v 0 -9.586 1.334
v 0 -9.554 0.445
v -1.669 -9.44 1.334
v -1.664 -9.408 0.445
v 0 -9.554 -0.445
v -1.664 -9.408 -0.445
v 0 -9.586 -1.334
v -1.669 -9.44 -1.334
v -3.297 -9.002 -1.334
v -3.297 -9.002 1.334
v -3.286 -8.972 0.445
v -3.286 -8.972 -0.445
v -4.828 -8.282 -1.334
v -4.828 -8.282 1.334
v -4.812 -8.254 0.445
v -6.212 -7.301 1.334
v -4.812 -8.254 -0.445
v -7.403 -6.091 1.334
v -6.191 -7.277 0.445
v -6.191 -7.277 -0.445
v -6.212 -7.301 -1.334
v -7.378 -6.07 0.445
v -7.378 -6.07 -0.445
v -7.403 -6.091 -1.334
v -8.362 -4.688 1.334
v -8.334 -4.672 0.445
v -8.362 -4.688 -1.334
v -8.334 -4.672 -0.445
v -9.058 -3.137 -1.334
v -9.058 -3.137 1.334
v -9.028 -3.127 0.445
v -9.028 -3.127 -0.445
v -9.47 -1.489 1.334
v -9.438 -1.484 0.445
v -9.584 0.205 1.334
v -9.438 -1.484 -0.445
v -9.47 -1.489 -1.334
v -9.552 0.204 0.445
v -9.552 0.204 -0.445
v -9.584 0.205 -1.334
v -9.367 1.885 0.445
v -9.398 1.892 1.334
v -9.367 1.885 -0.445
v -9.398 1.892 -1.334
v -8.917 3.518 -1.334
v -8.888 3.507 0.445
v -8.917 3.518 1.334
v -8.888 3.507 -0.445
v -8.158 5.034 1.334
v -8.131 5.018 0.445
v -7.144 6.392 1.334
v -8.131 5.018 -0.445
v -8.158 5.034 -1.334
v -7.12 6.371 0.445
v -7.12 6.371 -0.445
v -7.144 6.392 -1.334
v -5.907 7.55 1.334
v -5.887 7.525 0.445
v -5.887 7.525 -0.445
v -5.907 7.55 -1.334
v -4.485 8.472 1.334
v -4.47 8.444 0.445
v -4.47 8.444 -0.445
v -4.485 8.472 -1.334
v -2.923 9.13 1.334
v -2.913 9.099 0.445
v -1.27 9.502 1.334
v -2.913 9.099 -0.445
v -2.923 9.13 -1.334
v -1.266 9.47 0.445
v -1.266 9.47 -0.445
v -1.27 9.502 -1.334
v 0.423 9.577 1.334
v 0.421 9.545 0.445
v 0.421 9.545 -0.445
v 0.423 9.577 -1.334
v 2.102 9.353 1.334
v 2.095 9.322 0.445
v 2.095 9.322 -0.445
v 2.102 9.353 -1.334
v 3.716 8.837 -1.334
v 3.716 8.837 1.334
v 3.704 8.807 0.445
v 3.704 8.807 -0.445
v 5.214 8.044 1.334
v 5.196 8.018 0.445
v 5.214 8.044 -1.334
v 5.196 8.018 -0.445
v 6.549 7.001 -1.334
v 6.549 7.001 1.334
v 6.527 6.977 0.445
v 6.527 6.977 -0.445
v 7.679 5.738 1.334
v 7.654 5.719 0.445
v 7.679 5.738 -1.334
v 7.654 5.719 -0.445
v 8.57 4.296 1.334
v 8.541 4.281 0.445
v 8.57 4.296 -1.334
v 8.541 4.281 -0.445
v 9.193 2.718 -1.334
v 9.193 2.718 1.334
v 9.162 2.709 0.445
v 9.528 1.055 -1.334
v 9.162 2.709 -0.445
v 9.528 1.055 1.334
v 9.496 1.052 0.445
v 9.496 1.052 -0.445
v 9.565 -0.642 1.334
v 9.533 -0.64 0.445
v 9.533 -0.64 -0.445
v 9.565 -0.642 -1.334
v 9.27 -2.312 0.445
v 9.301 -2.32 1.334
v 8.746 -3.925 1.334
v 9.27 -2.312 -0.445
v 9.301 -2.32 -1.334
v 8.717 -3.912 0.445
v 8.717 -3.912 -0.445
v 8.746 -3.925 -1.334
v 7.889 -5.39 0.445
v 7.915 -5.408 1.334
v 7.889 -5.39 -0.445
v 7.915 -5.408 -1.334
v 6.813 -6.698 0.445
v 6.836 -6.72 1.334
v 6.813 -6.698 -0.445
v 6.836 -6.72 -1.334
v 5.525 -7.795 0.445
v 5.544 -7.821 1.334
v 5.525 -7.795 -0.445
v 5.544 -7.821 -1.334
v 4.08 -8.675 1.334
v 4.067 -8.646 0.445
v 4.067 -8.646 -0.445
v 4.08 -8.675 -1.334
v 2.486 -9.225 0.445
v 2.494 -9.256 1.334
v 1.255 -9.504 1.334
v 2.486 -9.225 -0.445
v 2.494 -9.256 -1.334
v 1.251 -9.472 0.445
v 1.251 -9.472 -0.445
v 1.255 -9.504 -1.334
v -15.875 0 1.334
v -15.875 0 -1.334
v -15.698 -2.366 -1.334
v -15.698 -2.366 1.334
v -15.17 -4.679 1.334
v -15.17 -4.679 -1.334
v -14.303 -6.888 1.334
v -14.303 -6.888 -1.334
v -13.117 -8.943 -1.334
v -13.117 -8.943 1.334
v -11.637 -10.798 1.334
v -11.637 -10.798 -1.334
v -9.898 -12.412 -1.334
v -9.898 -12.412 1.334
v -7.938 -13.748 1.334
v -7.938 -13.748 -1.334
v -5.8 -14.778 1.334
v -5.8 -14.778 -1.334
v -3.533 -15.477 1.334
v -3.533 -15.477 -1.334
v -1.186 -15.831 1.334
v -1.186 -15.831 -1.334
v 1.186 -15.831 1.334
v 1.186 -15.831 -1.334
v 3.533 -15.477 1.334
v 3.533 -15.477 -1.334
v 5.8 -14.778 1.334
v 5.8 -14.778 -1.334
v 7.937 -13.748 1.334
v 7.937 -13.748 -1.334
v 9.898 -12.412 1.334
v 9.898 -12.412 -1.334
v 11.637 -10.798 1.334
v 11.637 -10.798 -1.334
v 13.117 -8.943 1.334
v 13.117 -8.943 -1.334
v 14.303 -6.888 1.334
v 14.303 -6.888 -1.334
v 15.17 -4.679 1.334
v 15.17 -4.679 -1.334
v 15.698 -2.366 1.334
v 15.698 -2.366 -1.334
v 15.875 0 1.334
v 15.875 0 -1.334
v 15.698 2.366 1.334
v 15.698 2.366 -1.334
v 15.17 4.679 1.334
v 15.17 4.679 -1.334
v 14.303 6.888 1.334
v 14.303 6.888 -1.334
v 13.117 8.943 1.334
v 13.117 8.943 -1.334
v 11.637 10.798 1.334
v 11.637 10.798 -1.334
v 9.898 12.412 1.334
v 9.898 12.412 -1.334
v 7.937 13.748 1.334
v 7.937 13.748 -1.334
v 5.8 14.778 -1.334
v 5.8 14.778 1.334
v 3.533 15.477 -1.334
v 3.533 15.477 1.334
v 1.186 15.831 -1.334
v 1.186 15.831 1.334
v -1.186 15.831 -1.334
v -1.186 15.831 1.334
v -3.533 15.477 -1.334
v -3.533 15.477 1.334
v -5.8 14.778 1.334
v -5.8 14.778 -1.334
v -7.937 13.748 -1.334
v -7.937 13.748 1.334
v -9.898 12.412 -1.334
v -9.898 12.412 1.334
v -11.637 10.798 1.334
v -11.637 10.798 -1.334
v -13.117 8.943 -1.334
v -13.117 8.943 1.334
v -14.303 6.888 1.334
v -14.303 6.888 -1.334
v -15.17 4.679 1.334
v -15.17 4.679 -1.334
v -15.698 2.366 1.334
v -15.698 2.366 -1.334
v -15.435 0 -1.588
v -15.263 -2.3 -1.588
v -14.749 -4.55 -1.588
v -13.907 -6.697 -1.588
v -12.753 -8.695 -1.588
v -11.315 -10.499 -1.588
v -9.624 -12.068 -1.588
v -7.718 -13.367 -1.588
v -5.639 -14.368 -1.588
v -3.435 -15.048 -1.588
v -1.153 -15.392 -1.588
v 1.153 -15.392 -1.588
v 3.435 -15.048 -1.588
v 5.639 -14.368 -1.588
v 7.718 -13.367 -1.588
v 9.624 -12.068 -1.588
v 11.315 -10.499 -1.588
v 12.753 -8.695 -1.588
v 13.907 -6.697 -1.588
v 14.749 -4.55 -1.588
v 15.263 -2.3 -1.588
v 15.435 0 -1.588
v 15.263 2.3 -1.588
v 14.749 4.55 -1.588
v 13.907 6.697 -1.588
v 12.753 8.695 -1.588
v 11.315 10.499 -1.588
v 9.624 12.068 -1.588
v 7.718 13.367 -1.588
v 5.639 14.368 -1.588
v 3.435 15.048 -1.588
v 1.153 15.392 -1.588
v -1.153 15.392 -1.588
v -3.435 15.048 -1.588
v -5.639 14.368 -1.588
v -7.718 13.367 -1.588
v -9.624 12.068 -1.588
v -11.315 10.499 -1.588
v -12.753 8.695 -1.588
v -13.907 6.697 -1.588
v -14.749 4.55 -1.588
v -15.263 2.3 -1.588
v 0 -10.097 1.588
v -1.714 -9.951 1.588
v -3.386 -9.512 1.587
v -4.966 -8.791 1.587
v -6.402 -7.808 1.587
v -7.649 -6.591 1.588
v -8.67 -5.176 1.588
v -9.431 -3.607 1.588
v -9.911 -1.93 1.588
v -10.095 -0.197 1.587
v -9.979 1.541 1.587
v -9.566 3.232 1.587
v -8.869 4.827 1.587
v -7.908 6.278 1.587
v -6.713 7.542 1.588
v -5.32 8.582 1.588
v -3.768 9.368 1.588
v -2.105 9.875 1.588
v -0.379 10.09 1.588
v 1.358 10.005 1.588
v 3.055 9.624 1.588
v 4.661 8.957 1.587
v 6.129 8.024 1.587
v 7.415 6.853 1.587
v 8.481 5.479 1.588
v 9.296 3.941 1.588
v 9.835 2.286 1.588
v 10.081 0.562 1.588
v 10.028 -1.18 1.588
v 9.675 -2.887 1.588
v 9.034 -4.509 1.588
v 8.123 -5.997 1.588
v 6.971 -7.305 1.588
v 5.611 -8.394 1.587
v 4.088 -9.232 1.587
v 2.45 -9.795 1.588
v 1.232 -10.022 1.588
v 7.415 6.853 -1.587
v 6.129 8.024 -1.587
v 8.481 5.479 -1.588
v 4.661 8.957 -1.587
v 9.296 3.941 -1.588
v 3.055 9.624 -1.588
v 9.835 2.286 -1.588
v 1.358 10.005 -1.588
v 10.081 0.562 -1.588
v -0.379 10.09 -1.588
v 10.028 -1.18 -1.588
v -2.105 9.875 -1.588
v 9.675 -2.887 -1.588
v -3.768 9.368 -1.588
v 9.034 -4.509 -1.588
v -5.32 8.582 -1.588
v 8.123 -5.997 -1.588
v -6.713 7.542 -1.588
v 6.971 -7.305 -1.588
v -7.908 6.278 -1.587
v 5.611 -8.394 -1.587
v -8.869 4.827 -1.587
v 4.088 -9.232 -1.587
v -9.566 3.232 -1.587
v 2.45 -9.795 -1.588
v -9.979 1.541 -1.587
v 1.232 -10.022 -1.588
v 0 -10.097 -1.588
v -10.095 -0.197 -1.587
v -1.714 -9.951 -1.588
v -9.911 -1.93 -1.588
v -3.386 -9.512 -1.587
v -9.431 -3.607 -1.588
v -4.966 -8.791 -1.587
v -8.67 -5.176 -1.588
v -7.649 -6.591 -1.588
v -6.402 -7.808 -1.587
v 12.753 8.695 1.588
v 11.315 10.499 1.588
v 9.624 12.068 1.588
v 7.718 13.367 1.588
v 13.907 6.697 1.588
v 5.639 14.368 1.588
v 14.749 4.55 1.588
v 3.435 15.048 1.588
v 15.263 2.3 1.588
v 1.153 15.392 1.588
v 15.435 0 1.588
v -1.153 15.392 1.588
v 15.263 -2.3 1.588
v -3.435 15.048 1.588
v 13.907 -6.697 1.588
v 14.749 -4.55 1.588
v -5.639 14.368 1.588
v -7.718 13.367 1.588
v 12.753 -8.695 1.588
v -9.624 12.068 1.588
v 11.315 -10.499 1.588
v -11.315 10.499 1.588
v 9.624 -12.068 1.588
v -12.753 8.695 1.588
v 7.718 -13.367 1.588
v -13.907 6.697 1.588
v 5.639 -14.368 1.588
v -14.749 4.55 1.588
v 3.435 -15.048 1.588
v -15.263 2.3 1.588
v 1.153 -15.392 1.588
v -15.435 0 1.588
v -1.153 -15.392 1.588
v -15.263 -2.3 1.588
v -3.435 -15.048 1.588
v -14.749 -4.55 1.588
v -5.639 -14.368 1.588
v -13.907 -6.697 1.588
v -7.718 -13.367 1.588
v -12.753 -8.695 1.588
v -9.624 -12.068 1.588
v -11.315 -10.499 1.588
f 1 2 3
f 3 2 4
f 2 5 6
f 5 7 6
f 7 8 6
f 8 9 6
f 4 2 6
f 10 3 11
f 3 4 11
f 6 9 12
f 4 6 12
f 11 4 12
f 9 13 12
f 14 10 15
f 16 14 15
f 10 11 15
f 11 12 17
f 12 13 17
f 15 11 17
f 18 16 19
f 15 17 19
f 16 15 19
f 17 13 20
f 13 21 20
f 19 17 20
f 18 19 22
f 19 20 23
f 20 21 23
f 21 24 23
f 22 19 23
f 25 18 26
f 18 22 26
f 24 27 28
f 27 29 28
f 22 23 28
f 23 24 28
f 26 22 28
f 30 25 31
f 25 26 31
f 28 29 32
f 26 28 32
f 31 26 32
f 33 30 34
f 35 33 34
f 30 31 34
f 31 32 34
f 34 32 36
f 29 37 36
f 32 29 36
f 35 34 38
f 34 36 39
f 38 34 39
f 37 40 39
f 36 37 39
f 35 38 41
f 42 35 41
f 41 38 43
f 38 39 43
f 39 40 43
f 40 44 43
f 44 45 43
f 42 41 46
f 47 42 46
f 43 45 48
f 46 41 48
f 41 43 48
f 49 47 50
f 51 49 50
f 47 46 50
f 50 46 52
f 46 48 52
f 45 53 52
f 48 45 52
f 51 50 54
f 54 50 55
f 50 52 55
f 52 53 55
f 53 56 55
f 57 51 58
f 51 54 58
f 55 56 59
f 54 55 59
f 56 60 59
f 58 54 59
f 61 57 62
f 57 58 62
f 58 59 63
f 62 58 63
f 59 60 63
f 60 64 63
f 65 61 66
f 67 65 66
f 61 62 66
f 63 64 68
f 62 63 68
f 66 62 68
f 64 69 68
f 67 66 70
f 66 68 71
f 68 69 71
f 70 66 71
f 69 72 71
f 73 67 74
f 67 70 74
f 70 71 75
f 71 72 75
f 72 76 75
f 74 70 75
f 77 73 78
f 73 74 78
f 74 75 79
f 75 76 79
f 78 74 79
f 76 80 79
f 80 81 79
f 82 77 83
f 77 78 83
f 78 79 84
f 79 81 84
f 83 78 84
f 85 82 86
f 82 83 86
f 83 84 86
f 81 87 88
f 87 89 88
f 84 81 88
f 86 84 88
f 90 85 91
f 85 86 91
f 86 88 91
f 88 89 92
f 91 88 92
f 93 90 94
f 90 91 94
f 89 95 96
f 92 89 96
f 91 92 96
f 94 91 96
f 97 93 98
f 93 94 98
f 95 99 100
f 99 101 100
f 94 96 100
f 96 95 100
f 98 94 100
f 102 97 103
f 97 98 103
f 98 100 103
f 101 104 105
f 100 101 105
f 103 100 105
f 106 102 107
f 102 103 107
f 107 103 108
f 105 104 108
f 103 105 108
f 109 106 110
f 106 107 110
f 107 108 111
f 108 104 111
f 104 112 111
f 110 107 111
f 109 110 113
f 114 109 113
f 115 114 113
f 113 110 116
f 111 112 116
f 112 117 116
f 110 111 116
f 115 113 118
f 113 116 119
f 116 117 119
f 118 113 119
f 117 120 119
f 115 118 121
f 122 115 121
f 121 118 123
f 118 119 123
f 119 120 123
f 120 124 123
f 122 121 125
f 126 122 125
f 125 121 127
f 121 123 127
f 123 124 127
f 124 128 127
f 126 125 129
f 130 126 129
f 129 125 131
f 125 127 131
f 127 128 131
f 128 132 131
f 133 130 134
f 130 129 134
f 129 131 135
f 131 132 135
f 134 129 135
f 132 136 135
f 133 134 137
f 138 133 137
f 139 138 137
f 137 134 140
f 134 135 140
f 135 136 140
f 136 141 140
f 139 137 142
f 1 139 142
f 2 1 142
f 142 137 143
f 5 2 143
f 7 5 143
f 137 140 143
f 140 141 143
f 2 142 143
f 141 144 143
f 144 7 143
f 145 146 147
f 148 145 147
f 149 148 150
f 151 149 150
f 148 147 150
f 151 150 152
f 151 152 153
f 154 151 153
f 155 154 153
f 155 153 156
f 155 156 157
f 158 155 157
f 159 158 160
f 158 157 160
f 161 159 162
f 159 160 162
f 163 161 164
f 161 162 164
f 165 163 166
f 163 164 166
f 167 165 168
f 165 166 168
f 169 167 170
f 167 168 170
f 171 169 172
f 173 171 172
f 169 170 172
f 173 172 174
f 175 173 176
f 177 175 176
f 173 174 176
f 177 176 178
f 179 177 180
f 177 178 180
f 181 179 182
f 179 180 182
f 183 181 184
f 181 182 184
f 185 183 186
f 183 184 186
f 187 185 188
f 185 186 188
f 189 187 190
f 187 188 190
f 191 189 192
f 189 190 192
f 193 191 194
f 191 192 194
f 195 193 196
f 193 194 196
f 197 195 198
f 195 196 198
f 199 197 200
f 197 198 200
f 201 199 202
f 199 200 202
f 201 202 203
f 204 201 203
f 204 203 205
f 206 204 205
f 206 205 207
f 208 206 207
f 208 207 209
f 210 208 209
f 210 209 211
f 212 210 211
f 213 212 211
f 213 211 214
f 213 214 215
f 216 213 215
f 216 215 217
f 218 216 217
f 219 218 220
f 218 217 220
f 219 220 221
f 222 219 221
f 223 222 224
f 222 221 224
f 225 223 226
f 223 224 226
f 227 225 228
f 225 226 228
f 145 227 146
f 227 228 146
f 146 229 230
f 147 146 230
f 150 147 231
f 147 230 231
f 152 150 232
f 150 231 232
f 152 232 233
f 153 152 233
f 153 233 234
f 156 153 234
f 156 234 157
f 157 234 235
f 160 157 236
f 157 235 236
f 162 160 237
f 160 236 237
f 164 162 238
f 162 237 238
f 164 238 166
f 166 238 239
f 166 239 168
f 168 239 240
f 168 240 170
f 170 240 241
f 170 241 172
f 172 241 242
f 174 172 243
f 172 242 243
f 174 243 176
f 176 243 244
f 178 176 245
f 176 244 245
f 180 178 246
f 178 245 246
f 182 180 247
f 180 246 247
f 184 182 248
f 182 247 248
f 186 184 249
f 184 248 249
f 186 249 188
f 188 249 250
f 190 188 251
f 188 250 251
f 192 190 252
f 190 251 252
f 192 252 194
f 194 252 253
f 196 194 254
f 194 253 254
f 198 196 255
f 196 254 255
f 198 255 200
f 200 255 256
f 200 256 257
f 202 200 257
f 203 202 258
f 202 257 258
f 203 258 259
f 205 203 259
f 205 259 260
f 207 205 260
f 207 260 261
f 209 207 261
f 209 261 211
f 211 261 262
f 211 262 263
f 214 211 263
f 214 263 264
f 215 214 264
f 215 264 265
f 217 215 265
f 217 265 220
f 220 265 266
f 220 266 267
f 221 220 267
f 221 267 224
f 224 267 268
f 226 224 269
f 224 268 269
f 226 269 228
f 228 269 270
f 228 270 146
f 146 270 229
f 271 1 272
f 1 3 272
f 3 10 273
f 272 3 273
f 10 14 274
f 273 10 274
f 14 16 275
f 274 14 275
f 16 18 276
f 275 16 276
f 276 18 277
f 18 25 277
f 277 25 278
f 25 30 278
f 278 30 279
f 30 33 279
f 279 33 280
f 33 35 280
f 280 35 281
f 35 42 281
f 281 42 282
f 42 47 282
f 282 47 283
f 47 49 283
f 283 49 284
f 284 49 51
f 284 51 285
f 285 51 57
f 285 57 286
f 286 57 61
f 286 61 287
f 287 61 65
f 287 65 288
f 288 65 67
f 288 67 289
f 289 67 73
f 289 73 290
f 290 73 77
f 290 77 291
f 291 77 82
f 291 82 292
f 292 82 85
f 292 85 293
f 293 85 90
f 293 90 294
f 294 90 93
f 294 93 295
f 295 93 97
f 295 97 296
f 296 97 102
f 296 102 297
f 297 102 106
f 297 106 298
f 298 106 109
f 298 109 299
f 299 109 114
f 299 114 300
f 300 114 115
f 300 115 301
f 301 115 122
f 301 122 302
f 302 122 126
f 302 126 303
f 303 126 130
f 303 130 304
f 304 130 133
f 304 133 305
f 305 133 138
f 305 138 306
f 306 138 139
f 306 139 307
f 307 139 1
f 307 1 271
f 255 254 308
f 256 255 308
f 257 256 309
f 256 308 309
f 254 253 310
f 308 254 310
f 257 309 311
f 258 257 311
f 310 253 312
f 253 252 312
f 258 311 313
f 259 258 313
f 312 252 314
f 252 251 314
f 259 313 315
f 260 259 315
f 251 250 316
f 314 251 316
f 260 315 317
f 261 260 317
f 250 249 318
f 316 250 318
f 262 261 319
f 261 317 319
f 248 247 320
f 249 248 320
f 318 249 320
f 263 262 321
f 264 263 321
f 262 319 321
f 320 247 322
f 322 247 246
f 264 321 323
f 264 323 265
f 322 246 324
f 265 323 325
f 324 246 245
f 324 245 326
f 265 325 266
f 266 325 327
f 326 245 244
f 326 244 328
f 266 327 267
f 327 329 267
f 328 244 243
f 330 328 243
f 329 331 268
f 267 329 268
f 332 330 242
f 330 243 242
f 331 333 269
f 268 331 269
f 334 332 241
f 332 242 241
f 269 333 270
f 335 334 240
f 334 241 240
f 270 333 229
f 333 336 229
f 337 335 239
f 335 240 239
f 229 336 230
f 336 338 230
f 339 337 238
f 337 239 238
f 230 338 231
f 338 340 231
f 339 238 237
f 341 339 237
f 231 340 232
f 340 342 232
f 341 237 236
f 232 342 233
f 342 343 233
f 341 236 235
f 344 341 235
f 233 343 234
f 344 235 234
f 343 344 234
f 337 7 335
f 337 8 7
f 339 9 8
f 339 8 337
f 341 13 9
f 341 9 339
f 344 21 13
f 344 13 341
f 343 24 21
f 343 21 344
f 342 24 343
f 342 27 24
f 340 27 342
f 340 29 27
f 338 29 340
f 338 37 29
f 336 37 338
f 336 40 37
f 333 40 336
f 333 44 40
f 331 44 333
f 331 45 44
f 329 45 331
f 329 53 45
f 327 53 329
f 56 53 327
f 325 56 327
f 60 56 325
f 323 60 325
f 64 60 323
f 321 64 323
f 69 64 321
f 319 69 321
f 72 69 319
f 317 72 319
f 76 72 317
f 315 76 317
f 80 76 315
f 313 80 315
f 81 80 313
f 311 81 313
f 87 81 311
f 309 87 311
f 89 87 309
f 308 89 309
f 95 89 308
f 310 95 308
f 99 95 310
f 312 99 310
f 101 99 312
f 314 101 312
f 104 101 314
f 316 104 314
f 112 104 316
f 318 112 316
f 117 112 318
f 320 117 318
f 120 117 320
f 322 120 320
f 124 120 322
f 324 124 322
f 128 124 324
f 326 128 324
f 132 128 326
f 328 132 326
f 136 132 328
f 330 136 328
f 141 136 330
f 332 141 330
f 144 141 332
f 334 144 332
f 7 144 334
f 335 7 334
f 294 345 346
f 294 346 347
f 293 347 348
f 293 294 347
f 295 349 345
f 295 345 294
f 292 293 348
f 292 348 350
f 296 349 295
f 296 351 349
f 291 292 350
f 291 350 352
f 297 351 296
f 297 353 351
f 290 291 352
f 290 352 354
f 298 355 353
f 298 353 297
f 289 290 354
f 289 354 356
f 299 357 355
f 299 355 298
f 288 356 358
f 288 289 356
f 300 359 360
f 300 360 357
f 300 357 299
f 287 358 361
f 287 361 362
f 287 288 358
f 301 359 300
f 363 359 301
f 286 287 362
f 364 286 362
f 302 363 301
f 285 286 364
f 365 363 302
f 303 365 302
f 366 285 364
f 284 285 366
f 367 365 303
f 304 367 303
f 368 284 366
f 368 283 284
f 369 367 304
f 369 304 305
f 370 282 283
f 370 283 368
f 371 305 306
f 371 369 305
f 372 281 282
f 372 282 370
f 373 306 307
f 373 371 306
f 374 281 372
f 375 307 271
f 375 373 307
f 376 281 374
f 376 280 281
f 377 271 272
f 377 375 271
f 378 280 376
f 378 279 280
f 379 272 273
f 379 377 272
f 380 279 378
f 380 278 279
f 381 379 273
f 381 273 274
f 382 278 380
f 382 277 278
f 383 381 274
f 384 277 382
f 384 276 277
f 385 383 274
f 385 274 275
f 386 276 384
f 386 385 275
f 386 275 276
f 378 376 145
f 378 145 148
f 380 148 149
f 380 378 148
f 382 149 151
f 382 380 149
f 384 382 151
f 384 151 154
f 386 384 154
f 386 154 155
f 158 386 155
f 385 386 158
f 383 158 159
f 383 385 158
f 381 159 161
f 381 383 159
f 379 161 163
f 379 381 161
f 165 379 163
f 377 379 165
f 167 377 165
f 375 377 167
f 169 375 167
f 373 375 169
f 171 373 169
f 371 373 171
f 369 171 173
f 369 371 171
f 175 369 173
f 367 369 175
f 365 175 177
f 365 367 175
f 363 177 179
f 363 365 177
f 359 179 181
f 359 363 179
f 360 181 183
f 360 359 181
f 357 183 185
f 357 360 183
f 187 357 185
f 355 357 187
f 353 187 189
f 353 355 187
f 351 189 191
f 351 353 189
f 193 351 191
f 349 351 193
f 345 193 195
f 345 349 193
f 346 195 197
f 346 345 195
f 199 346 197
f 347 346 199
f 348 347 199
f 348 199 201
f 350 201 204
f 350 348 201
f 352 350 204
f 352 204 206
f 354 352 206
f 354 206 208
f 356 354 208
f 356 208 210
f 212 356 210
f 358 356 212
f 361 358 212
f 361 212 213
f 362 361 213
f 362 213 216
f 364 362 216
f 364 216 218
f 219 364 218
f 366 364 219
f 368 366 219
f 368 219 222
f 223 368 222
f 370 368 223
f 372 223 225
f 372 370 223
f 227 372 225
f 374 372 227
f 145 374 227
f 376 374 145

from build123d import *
from OCP.BRepFilletAPI import BRepFilletAPI_MakeChamfer

# Parameters (mm, degrees)
BOSS_EXTRUDE1_DEPTH      = 1.5875
BOSS_EXTRUDE1_DEPTH_BACK = 1.5875
SKETCH3_R                = 15.875
SKETCH3_R_2              = 9.5504
CHAMFER1_SIZE            = 0.254
CHAMFER1_SIZE2           = 0.439940905
CHAMFER2_SIZE            = 0.254
CHAMFER2_SIZE2           = 0.495866606


with BuildPart() as part:
    # Sketch3 → Boss-Extrude1 (new, two sides: drawn at the far end of the back side and taken through both)
    with BuildSketch(Plane.XY.offset(-BOSS_EXTRUDE1_DEPTH_BACK)):
        with Locations(Location((0, 0, 0), (0, 0, 180))):
            Circle(SKETCH3_R)
        with Locations(Location((0, 0, 0), (0, 0, 180))):
            Circle(SKETCH3_R_2, mode=Mode.SUBTRACT)
    extrude(amount=BOSS_EXTRUDE1_DEPTH + BOSS_EXTRUDE1_DEPTH_BACK)

    # Chamfer1: one chamfer whose edges measure the first distance from different faces: ONE call of the kernel's chamfer builder (chamfer() names one face for all edges)
    chamfer1_edges_1 = [part.edges().sort_by_distance(p)[0] for p in [
        (15.875, 0, 1.5875),
    ]]
    chamfer1_side_1 = [part.faces().sort_by_distance(p)[0] for p in [
        (15.875, 0, 0.79375),
    ]]
    chamfer1_edges_2 = [part.edges().sort_by_distance(p)[0] for p in [
        (15.875, 0, -1.5875),
    ]]
    chamfer1_side_2 = [part.faces().sort_by_distance(p)[0] for p in [
        (15.875, 0, -0.79375),
    ]]
    chamfer1 = BRepFilletAPI_MakeChamfer(part.part.solid().wrapped)
    for e in chamfer1_edges_1:
        chamfer1.Add(CHAMFER1_SIZE, CHAMFER1_SIZE2, e.wrapped, chamfer1_side_1[0].wrapped)  # the first distance lies on this face
    for e in chamfer1_edges_2:
        chamfer1.Add(CHAMFER1_SIZE, CHAMFER1_SIZE2, e.wrapped, chamfer1_side_2[0].wrapped)  # the first distance lies on this face
    add(Compound.cast(chamfer1.Shape()), mode=Mode.REPLACE)

    # Sketch4 → Cut-Revolve1 (revolve, cut)
    with BuildSketch(Plane(origin=(0, 0, 0), x_dir=(0, 0, -1), z_dir=(1, 0, 0)), mode=Mode.PRIVATE) as cut_revolve1_sk:
        with BuildLine():
            Line((-1.5875, 9.4996), (-1.5875, 9.6012))
            ThreePointArc((-1.5875, 9.6012), (0, 9.5504), (1.5875, 9.6012))
            Line((1.5875, 9.6012), (1.5875, 9.4996))
            Line((1.5875, 9.4996), (-1.5875, 9.4996))
        make_face()
    revolve(cut_revolve1_sk.sketch.rotate(Axis((0, 0, 1.5875), (0, 0, -1)), 180), axis=Axis((0, 0, 1.5875), (0, 0, -1)), mode=Mode.SUBTRACT)

    # Chamfer2: one chamfer whose edges measure the first distance from different faces: ONE call of the kernel's chamfer builder (chamfer() names one face for all edges)
    chamfer2_edges_1 = [part.edges().sort_by_distance(p)[0] for p in [
        (0, 9.6012, -1.5875),
    ]]
    chamfer2_side_1 = [part.faces().sort_by_distance(p)[0] for p in [
        (0, 9.56310325, -0.794156296),
    ]]
    chamfer2_edges_2 = [part.edges().sort_by_distance(p)[0] for p in [
        (0, 9.6012, 1.5875),
    ]]
    chamfer2_side_2 = [part.faces().sort_by_distance(p)[0] for p in [
        (0, 9.56310325, 0.794156296),
    ]]
    chamfer2 = BRepFilletAPI_MakeChamfer(part.part.solid().wrapped)
    for e in chamfer2_edges_1:
        chamfer2.Add(CHAMFER2_SIZE, CHAMFER2_SIZE2, e.wrapped, chamfer2_side_1[0].wrapped)  # the first distance lies on this face
    for e in chamfer2_edges_2:
        chamfer2.Add(CHAMFER2_SIZE, CHAMFER2_SIZE2, e.wrapped, chamfer2_side_2[0].wrapped)  # the first distance lies on this face
    add(Compound.cast(chamfer2.Shape()), mode=Mode.REPLACE)


solid = part.part
